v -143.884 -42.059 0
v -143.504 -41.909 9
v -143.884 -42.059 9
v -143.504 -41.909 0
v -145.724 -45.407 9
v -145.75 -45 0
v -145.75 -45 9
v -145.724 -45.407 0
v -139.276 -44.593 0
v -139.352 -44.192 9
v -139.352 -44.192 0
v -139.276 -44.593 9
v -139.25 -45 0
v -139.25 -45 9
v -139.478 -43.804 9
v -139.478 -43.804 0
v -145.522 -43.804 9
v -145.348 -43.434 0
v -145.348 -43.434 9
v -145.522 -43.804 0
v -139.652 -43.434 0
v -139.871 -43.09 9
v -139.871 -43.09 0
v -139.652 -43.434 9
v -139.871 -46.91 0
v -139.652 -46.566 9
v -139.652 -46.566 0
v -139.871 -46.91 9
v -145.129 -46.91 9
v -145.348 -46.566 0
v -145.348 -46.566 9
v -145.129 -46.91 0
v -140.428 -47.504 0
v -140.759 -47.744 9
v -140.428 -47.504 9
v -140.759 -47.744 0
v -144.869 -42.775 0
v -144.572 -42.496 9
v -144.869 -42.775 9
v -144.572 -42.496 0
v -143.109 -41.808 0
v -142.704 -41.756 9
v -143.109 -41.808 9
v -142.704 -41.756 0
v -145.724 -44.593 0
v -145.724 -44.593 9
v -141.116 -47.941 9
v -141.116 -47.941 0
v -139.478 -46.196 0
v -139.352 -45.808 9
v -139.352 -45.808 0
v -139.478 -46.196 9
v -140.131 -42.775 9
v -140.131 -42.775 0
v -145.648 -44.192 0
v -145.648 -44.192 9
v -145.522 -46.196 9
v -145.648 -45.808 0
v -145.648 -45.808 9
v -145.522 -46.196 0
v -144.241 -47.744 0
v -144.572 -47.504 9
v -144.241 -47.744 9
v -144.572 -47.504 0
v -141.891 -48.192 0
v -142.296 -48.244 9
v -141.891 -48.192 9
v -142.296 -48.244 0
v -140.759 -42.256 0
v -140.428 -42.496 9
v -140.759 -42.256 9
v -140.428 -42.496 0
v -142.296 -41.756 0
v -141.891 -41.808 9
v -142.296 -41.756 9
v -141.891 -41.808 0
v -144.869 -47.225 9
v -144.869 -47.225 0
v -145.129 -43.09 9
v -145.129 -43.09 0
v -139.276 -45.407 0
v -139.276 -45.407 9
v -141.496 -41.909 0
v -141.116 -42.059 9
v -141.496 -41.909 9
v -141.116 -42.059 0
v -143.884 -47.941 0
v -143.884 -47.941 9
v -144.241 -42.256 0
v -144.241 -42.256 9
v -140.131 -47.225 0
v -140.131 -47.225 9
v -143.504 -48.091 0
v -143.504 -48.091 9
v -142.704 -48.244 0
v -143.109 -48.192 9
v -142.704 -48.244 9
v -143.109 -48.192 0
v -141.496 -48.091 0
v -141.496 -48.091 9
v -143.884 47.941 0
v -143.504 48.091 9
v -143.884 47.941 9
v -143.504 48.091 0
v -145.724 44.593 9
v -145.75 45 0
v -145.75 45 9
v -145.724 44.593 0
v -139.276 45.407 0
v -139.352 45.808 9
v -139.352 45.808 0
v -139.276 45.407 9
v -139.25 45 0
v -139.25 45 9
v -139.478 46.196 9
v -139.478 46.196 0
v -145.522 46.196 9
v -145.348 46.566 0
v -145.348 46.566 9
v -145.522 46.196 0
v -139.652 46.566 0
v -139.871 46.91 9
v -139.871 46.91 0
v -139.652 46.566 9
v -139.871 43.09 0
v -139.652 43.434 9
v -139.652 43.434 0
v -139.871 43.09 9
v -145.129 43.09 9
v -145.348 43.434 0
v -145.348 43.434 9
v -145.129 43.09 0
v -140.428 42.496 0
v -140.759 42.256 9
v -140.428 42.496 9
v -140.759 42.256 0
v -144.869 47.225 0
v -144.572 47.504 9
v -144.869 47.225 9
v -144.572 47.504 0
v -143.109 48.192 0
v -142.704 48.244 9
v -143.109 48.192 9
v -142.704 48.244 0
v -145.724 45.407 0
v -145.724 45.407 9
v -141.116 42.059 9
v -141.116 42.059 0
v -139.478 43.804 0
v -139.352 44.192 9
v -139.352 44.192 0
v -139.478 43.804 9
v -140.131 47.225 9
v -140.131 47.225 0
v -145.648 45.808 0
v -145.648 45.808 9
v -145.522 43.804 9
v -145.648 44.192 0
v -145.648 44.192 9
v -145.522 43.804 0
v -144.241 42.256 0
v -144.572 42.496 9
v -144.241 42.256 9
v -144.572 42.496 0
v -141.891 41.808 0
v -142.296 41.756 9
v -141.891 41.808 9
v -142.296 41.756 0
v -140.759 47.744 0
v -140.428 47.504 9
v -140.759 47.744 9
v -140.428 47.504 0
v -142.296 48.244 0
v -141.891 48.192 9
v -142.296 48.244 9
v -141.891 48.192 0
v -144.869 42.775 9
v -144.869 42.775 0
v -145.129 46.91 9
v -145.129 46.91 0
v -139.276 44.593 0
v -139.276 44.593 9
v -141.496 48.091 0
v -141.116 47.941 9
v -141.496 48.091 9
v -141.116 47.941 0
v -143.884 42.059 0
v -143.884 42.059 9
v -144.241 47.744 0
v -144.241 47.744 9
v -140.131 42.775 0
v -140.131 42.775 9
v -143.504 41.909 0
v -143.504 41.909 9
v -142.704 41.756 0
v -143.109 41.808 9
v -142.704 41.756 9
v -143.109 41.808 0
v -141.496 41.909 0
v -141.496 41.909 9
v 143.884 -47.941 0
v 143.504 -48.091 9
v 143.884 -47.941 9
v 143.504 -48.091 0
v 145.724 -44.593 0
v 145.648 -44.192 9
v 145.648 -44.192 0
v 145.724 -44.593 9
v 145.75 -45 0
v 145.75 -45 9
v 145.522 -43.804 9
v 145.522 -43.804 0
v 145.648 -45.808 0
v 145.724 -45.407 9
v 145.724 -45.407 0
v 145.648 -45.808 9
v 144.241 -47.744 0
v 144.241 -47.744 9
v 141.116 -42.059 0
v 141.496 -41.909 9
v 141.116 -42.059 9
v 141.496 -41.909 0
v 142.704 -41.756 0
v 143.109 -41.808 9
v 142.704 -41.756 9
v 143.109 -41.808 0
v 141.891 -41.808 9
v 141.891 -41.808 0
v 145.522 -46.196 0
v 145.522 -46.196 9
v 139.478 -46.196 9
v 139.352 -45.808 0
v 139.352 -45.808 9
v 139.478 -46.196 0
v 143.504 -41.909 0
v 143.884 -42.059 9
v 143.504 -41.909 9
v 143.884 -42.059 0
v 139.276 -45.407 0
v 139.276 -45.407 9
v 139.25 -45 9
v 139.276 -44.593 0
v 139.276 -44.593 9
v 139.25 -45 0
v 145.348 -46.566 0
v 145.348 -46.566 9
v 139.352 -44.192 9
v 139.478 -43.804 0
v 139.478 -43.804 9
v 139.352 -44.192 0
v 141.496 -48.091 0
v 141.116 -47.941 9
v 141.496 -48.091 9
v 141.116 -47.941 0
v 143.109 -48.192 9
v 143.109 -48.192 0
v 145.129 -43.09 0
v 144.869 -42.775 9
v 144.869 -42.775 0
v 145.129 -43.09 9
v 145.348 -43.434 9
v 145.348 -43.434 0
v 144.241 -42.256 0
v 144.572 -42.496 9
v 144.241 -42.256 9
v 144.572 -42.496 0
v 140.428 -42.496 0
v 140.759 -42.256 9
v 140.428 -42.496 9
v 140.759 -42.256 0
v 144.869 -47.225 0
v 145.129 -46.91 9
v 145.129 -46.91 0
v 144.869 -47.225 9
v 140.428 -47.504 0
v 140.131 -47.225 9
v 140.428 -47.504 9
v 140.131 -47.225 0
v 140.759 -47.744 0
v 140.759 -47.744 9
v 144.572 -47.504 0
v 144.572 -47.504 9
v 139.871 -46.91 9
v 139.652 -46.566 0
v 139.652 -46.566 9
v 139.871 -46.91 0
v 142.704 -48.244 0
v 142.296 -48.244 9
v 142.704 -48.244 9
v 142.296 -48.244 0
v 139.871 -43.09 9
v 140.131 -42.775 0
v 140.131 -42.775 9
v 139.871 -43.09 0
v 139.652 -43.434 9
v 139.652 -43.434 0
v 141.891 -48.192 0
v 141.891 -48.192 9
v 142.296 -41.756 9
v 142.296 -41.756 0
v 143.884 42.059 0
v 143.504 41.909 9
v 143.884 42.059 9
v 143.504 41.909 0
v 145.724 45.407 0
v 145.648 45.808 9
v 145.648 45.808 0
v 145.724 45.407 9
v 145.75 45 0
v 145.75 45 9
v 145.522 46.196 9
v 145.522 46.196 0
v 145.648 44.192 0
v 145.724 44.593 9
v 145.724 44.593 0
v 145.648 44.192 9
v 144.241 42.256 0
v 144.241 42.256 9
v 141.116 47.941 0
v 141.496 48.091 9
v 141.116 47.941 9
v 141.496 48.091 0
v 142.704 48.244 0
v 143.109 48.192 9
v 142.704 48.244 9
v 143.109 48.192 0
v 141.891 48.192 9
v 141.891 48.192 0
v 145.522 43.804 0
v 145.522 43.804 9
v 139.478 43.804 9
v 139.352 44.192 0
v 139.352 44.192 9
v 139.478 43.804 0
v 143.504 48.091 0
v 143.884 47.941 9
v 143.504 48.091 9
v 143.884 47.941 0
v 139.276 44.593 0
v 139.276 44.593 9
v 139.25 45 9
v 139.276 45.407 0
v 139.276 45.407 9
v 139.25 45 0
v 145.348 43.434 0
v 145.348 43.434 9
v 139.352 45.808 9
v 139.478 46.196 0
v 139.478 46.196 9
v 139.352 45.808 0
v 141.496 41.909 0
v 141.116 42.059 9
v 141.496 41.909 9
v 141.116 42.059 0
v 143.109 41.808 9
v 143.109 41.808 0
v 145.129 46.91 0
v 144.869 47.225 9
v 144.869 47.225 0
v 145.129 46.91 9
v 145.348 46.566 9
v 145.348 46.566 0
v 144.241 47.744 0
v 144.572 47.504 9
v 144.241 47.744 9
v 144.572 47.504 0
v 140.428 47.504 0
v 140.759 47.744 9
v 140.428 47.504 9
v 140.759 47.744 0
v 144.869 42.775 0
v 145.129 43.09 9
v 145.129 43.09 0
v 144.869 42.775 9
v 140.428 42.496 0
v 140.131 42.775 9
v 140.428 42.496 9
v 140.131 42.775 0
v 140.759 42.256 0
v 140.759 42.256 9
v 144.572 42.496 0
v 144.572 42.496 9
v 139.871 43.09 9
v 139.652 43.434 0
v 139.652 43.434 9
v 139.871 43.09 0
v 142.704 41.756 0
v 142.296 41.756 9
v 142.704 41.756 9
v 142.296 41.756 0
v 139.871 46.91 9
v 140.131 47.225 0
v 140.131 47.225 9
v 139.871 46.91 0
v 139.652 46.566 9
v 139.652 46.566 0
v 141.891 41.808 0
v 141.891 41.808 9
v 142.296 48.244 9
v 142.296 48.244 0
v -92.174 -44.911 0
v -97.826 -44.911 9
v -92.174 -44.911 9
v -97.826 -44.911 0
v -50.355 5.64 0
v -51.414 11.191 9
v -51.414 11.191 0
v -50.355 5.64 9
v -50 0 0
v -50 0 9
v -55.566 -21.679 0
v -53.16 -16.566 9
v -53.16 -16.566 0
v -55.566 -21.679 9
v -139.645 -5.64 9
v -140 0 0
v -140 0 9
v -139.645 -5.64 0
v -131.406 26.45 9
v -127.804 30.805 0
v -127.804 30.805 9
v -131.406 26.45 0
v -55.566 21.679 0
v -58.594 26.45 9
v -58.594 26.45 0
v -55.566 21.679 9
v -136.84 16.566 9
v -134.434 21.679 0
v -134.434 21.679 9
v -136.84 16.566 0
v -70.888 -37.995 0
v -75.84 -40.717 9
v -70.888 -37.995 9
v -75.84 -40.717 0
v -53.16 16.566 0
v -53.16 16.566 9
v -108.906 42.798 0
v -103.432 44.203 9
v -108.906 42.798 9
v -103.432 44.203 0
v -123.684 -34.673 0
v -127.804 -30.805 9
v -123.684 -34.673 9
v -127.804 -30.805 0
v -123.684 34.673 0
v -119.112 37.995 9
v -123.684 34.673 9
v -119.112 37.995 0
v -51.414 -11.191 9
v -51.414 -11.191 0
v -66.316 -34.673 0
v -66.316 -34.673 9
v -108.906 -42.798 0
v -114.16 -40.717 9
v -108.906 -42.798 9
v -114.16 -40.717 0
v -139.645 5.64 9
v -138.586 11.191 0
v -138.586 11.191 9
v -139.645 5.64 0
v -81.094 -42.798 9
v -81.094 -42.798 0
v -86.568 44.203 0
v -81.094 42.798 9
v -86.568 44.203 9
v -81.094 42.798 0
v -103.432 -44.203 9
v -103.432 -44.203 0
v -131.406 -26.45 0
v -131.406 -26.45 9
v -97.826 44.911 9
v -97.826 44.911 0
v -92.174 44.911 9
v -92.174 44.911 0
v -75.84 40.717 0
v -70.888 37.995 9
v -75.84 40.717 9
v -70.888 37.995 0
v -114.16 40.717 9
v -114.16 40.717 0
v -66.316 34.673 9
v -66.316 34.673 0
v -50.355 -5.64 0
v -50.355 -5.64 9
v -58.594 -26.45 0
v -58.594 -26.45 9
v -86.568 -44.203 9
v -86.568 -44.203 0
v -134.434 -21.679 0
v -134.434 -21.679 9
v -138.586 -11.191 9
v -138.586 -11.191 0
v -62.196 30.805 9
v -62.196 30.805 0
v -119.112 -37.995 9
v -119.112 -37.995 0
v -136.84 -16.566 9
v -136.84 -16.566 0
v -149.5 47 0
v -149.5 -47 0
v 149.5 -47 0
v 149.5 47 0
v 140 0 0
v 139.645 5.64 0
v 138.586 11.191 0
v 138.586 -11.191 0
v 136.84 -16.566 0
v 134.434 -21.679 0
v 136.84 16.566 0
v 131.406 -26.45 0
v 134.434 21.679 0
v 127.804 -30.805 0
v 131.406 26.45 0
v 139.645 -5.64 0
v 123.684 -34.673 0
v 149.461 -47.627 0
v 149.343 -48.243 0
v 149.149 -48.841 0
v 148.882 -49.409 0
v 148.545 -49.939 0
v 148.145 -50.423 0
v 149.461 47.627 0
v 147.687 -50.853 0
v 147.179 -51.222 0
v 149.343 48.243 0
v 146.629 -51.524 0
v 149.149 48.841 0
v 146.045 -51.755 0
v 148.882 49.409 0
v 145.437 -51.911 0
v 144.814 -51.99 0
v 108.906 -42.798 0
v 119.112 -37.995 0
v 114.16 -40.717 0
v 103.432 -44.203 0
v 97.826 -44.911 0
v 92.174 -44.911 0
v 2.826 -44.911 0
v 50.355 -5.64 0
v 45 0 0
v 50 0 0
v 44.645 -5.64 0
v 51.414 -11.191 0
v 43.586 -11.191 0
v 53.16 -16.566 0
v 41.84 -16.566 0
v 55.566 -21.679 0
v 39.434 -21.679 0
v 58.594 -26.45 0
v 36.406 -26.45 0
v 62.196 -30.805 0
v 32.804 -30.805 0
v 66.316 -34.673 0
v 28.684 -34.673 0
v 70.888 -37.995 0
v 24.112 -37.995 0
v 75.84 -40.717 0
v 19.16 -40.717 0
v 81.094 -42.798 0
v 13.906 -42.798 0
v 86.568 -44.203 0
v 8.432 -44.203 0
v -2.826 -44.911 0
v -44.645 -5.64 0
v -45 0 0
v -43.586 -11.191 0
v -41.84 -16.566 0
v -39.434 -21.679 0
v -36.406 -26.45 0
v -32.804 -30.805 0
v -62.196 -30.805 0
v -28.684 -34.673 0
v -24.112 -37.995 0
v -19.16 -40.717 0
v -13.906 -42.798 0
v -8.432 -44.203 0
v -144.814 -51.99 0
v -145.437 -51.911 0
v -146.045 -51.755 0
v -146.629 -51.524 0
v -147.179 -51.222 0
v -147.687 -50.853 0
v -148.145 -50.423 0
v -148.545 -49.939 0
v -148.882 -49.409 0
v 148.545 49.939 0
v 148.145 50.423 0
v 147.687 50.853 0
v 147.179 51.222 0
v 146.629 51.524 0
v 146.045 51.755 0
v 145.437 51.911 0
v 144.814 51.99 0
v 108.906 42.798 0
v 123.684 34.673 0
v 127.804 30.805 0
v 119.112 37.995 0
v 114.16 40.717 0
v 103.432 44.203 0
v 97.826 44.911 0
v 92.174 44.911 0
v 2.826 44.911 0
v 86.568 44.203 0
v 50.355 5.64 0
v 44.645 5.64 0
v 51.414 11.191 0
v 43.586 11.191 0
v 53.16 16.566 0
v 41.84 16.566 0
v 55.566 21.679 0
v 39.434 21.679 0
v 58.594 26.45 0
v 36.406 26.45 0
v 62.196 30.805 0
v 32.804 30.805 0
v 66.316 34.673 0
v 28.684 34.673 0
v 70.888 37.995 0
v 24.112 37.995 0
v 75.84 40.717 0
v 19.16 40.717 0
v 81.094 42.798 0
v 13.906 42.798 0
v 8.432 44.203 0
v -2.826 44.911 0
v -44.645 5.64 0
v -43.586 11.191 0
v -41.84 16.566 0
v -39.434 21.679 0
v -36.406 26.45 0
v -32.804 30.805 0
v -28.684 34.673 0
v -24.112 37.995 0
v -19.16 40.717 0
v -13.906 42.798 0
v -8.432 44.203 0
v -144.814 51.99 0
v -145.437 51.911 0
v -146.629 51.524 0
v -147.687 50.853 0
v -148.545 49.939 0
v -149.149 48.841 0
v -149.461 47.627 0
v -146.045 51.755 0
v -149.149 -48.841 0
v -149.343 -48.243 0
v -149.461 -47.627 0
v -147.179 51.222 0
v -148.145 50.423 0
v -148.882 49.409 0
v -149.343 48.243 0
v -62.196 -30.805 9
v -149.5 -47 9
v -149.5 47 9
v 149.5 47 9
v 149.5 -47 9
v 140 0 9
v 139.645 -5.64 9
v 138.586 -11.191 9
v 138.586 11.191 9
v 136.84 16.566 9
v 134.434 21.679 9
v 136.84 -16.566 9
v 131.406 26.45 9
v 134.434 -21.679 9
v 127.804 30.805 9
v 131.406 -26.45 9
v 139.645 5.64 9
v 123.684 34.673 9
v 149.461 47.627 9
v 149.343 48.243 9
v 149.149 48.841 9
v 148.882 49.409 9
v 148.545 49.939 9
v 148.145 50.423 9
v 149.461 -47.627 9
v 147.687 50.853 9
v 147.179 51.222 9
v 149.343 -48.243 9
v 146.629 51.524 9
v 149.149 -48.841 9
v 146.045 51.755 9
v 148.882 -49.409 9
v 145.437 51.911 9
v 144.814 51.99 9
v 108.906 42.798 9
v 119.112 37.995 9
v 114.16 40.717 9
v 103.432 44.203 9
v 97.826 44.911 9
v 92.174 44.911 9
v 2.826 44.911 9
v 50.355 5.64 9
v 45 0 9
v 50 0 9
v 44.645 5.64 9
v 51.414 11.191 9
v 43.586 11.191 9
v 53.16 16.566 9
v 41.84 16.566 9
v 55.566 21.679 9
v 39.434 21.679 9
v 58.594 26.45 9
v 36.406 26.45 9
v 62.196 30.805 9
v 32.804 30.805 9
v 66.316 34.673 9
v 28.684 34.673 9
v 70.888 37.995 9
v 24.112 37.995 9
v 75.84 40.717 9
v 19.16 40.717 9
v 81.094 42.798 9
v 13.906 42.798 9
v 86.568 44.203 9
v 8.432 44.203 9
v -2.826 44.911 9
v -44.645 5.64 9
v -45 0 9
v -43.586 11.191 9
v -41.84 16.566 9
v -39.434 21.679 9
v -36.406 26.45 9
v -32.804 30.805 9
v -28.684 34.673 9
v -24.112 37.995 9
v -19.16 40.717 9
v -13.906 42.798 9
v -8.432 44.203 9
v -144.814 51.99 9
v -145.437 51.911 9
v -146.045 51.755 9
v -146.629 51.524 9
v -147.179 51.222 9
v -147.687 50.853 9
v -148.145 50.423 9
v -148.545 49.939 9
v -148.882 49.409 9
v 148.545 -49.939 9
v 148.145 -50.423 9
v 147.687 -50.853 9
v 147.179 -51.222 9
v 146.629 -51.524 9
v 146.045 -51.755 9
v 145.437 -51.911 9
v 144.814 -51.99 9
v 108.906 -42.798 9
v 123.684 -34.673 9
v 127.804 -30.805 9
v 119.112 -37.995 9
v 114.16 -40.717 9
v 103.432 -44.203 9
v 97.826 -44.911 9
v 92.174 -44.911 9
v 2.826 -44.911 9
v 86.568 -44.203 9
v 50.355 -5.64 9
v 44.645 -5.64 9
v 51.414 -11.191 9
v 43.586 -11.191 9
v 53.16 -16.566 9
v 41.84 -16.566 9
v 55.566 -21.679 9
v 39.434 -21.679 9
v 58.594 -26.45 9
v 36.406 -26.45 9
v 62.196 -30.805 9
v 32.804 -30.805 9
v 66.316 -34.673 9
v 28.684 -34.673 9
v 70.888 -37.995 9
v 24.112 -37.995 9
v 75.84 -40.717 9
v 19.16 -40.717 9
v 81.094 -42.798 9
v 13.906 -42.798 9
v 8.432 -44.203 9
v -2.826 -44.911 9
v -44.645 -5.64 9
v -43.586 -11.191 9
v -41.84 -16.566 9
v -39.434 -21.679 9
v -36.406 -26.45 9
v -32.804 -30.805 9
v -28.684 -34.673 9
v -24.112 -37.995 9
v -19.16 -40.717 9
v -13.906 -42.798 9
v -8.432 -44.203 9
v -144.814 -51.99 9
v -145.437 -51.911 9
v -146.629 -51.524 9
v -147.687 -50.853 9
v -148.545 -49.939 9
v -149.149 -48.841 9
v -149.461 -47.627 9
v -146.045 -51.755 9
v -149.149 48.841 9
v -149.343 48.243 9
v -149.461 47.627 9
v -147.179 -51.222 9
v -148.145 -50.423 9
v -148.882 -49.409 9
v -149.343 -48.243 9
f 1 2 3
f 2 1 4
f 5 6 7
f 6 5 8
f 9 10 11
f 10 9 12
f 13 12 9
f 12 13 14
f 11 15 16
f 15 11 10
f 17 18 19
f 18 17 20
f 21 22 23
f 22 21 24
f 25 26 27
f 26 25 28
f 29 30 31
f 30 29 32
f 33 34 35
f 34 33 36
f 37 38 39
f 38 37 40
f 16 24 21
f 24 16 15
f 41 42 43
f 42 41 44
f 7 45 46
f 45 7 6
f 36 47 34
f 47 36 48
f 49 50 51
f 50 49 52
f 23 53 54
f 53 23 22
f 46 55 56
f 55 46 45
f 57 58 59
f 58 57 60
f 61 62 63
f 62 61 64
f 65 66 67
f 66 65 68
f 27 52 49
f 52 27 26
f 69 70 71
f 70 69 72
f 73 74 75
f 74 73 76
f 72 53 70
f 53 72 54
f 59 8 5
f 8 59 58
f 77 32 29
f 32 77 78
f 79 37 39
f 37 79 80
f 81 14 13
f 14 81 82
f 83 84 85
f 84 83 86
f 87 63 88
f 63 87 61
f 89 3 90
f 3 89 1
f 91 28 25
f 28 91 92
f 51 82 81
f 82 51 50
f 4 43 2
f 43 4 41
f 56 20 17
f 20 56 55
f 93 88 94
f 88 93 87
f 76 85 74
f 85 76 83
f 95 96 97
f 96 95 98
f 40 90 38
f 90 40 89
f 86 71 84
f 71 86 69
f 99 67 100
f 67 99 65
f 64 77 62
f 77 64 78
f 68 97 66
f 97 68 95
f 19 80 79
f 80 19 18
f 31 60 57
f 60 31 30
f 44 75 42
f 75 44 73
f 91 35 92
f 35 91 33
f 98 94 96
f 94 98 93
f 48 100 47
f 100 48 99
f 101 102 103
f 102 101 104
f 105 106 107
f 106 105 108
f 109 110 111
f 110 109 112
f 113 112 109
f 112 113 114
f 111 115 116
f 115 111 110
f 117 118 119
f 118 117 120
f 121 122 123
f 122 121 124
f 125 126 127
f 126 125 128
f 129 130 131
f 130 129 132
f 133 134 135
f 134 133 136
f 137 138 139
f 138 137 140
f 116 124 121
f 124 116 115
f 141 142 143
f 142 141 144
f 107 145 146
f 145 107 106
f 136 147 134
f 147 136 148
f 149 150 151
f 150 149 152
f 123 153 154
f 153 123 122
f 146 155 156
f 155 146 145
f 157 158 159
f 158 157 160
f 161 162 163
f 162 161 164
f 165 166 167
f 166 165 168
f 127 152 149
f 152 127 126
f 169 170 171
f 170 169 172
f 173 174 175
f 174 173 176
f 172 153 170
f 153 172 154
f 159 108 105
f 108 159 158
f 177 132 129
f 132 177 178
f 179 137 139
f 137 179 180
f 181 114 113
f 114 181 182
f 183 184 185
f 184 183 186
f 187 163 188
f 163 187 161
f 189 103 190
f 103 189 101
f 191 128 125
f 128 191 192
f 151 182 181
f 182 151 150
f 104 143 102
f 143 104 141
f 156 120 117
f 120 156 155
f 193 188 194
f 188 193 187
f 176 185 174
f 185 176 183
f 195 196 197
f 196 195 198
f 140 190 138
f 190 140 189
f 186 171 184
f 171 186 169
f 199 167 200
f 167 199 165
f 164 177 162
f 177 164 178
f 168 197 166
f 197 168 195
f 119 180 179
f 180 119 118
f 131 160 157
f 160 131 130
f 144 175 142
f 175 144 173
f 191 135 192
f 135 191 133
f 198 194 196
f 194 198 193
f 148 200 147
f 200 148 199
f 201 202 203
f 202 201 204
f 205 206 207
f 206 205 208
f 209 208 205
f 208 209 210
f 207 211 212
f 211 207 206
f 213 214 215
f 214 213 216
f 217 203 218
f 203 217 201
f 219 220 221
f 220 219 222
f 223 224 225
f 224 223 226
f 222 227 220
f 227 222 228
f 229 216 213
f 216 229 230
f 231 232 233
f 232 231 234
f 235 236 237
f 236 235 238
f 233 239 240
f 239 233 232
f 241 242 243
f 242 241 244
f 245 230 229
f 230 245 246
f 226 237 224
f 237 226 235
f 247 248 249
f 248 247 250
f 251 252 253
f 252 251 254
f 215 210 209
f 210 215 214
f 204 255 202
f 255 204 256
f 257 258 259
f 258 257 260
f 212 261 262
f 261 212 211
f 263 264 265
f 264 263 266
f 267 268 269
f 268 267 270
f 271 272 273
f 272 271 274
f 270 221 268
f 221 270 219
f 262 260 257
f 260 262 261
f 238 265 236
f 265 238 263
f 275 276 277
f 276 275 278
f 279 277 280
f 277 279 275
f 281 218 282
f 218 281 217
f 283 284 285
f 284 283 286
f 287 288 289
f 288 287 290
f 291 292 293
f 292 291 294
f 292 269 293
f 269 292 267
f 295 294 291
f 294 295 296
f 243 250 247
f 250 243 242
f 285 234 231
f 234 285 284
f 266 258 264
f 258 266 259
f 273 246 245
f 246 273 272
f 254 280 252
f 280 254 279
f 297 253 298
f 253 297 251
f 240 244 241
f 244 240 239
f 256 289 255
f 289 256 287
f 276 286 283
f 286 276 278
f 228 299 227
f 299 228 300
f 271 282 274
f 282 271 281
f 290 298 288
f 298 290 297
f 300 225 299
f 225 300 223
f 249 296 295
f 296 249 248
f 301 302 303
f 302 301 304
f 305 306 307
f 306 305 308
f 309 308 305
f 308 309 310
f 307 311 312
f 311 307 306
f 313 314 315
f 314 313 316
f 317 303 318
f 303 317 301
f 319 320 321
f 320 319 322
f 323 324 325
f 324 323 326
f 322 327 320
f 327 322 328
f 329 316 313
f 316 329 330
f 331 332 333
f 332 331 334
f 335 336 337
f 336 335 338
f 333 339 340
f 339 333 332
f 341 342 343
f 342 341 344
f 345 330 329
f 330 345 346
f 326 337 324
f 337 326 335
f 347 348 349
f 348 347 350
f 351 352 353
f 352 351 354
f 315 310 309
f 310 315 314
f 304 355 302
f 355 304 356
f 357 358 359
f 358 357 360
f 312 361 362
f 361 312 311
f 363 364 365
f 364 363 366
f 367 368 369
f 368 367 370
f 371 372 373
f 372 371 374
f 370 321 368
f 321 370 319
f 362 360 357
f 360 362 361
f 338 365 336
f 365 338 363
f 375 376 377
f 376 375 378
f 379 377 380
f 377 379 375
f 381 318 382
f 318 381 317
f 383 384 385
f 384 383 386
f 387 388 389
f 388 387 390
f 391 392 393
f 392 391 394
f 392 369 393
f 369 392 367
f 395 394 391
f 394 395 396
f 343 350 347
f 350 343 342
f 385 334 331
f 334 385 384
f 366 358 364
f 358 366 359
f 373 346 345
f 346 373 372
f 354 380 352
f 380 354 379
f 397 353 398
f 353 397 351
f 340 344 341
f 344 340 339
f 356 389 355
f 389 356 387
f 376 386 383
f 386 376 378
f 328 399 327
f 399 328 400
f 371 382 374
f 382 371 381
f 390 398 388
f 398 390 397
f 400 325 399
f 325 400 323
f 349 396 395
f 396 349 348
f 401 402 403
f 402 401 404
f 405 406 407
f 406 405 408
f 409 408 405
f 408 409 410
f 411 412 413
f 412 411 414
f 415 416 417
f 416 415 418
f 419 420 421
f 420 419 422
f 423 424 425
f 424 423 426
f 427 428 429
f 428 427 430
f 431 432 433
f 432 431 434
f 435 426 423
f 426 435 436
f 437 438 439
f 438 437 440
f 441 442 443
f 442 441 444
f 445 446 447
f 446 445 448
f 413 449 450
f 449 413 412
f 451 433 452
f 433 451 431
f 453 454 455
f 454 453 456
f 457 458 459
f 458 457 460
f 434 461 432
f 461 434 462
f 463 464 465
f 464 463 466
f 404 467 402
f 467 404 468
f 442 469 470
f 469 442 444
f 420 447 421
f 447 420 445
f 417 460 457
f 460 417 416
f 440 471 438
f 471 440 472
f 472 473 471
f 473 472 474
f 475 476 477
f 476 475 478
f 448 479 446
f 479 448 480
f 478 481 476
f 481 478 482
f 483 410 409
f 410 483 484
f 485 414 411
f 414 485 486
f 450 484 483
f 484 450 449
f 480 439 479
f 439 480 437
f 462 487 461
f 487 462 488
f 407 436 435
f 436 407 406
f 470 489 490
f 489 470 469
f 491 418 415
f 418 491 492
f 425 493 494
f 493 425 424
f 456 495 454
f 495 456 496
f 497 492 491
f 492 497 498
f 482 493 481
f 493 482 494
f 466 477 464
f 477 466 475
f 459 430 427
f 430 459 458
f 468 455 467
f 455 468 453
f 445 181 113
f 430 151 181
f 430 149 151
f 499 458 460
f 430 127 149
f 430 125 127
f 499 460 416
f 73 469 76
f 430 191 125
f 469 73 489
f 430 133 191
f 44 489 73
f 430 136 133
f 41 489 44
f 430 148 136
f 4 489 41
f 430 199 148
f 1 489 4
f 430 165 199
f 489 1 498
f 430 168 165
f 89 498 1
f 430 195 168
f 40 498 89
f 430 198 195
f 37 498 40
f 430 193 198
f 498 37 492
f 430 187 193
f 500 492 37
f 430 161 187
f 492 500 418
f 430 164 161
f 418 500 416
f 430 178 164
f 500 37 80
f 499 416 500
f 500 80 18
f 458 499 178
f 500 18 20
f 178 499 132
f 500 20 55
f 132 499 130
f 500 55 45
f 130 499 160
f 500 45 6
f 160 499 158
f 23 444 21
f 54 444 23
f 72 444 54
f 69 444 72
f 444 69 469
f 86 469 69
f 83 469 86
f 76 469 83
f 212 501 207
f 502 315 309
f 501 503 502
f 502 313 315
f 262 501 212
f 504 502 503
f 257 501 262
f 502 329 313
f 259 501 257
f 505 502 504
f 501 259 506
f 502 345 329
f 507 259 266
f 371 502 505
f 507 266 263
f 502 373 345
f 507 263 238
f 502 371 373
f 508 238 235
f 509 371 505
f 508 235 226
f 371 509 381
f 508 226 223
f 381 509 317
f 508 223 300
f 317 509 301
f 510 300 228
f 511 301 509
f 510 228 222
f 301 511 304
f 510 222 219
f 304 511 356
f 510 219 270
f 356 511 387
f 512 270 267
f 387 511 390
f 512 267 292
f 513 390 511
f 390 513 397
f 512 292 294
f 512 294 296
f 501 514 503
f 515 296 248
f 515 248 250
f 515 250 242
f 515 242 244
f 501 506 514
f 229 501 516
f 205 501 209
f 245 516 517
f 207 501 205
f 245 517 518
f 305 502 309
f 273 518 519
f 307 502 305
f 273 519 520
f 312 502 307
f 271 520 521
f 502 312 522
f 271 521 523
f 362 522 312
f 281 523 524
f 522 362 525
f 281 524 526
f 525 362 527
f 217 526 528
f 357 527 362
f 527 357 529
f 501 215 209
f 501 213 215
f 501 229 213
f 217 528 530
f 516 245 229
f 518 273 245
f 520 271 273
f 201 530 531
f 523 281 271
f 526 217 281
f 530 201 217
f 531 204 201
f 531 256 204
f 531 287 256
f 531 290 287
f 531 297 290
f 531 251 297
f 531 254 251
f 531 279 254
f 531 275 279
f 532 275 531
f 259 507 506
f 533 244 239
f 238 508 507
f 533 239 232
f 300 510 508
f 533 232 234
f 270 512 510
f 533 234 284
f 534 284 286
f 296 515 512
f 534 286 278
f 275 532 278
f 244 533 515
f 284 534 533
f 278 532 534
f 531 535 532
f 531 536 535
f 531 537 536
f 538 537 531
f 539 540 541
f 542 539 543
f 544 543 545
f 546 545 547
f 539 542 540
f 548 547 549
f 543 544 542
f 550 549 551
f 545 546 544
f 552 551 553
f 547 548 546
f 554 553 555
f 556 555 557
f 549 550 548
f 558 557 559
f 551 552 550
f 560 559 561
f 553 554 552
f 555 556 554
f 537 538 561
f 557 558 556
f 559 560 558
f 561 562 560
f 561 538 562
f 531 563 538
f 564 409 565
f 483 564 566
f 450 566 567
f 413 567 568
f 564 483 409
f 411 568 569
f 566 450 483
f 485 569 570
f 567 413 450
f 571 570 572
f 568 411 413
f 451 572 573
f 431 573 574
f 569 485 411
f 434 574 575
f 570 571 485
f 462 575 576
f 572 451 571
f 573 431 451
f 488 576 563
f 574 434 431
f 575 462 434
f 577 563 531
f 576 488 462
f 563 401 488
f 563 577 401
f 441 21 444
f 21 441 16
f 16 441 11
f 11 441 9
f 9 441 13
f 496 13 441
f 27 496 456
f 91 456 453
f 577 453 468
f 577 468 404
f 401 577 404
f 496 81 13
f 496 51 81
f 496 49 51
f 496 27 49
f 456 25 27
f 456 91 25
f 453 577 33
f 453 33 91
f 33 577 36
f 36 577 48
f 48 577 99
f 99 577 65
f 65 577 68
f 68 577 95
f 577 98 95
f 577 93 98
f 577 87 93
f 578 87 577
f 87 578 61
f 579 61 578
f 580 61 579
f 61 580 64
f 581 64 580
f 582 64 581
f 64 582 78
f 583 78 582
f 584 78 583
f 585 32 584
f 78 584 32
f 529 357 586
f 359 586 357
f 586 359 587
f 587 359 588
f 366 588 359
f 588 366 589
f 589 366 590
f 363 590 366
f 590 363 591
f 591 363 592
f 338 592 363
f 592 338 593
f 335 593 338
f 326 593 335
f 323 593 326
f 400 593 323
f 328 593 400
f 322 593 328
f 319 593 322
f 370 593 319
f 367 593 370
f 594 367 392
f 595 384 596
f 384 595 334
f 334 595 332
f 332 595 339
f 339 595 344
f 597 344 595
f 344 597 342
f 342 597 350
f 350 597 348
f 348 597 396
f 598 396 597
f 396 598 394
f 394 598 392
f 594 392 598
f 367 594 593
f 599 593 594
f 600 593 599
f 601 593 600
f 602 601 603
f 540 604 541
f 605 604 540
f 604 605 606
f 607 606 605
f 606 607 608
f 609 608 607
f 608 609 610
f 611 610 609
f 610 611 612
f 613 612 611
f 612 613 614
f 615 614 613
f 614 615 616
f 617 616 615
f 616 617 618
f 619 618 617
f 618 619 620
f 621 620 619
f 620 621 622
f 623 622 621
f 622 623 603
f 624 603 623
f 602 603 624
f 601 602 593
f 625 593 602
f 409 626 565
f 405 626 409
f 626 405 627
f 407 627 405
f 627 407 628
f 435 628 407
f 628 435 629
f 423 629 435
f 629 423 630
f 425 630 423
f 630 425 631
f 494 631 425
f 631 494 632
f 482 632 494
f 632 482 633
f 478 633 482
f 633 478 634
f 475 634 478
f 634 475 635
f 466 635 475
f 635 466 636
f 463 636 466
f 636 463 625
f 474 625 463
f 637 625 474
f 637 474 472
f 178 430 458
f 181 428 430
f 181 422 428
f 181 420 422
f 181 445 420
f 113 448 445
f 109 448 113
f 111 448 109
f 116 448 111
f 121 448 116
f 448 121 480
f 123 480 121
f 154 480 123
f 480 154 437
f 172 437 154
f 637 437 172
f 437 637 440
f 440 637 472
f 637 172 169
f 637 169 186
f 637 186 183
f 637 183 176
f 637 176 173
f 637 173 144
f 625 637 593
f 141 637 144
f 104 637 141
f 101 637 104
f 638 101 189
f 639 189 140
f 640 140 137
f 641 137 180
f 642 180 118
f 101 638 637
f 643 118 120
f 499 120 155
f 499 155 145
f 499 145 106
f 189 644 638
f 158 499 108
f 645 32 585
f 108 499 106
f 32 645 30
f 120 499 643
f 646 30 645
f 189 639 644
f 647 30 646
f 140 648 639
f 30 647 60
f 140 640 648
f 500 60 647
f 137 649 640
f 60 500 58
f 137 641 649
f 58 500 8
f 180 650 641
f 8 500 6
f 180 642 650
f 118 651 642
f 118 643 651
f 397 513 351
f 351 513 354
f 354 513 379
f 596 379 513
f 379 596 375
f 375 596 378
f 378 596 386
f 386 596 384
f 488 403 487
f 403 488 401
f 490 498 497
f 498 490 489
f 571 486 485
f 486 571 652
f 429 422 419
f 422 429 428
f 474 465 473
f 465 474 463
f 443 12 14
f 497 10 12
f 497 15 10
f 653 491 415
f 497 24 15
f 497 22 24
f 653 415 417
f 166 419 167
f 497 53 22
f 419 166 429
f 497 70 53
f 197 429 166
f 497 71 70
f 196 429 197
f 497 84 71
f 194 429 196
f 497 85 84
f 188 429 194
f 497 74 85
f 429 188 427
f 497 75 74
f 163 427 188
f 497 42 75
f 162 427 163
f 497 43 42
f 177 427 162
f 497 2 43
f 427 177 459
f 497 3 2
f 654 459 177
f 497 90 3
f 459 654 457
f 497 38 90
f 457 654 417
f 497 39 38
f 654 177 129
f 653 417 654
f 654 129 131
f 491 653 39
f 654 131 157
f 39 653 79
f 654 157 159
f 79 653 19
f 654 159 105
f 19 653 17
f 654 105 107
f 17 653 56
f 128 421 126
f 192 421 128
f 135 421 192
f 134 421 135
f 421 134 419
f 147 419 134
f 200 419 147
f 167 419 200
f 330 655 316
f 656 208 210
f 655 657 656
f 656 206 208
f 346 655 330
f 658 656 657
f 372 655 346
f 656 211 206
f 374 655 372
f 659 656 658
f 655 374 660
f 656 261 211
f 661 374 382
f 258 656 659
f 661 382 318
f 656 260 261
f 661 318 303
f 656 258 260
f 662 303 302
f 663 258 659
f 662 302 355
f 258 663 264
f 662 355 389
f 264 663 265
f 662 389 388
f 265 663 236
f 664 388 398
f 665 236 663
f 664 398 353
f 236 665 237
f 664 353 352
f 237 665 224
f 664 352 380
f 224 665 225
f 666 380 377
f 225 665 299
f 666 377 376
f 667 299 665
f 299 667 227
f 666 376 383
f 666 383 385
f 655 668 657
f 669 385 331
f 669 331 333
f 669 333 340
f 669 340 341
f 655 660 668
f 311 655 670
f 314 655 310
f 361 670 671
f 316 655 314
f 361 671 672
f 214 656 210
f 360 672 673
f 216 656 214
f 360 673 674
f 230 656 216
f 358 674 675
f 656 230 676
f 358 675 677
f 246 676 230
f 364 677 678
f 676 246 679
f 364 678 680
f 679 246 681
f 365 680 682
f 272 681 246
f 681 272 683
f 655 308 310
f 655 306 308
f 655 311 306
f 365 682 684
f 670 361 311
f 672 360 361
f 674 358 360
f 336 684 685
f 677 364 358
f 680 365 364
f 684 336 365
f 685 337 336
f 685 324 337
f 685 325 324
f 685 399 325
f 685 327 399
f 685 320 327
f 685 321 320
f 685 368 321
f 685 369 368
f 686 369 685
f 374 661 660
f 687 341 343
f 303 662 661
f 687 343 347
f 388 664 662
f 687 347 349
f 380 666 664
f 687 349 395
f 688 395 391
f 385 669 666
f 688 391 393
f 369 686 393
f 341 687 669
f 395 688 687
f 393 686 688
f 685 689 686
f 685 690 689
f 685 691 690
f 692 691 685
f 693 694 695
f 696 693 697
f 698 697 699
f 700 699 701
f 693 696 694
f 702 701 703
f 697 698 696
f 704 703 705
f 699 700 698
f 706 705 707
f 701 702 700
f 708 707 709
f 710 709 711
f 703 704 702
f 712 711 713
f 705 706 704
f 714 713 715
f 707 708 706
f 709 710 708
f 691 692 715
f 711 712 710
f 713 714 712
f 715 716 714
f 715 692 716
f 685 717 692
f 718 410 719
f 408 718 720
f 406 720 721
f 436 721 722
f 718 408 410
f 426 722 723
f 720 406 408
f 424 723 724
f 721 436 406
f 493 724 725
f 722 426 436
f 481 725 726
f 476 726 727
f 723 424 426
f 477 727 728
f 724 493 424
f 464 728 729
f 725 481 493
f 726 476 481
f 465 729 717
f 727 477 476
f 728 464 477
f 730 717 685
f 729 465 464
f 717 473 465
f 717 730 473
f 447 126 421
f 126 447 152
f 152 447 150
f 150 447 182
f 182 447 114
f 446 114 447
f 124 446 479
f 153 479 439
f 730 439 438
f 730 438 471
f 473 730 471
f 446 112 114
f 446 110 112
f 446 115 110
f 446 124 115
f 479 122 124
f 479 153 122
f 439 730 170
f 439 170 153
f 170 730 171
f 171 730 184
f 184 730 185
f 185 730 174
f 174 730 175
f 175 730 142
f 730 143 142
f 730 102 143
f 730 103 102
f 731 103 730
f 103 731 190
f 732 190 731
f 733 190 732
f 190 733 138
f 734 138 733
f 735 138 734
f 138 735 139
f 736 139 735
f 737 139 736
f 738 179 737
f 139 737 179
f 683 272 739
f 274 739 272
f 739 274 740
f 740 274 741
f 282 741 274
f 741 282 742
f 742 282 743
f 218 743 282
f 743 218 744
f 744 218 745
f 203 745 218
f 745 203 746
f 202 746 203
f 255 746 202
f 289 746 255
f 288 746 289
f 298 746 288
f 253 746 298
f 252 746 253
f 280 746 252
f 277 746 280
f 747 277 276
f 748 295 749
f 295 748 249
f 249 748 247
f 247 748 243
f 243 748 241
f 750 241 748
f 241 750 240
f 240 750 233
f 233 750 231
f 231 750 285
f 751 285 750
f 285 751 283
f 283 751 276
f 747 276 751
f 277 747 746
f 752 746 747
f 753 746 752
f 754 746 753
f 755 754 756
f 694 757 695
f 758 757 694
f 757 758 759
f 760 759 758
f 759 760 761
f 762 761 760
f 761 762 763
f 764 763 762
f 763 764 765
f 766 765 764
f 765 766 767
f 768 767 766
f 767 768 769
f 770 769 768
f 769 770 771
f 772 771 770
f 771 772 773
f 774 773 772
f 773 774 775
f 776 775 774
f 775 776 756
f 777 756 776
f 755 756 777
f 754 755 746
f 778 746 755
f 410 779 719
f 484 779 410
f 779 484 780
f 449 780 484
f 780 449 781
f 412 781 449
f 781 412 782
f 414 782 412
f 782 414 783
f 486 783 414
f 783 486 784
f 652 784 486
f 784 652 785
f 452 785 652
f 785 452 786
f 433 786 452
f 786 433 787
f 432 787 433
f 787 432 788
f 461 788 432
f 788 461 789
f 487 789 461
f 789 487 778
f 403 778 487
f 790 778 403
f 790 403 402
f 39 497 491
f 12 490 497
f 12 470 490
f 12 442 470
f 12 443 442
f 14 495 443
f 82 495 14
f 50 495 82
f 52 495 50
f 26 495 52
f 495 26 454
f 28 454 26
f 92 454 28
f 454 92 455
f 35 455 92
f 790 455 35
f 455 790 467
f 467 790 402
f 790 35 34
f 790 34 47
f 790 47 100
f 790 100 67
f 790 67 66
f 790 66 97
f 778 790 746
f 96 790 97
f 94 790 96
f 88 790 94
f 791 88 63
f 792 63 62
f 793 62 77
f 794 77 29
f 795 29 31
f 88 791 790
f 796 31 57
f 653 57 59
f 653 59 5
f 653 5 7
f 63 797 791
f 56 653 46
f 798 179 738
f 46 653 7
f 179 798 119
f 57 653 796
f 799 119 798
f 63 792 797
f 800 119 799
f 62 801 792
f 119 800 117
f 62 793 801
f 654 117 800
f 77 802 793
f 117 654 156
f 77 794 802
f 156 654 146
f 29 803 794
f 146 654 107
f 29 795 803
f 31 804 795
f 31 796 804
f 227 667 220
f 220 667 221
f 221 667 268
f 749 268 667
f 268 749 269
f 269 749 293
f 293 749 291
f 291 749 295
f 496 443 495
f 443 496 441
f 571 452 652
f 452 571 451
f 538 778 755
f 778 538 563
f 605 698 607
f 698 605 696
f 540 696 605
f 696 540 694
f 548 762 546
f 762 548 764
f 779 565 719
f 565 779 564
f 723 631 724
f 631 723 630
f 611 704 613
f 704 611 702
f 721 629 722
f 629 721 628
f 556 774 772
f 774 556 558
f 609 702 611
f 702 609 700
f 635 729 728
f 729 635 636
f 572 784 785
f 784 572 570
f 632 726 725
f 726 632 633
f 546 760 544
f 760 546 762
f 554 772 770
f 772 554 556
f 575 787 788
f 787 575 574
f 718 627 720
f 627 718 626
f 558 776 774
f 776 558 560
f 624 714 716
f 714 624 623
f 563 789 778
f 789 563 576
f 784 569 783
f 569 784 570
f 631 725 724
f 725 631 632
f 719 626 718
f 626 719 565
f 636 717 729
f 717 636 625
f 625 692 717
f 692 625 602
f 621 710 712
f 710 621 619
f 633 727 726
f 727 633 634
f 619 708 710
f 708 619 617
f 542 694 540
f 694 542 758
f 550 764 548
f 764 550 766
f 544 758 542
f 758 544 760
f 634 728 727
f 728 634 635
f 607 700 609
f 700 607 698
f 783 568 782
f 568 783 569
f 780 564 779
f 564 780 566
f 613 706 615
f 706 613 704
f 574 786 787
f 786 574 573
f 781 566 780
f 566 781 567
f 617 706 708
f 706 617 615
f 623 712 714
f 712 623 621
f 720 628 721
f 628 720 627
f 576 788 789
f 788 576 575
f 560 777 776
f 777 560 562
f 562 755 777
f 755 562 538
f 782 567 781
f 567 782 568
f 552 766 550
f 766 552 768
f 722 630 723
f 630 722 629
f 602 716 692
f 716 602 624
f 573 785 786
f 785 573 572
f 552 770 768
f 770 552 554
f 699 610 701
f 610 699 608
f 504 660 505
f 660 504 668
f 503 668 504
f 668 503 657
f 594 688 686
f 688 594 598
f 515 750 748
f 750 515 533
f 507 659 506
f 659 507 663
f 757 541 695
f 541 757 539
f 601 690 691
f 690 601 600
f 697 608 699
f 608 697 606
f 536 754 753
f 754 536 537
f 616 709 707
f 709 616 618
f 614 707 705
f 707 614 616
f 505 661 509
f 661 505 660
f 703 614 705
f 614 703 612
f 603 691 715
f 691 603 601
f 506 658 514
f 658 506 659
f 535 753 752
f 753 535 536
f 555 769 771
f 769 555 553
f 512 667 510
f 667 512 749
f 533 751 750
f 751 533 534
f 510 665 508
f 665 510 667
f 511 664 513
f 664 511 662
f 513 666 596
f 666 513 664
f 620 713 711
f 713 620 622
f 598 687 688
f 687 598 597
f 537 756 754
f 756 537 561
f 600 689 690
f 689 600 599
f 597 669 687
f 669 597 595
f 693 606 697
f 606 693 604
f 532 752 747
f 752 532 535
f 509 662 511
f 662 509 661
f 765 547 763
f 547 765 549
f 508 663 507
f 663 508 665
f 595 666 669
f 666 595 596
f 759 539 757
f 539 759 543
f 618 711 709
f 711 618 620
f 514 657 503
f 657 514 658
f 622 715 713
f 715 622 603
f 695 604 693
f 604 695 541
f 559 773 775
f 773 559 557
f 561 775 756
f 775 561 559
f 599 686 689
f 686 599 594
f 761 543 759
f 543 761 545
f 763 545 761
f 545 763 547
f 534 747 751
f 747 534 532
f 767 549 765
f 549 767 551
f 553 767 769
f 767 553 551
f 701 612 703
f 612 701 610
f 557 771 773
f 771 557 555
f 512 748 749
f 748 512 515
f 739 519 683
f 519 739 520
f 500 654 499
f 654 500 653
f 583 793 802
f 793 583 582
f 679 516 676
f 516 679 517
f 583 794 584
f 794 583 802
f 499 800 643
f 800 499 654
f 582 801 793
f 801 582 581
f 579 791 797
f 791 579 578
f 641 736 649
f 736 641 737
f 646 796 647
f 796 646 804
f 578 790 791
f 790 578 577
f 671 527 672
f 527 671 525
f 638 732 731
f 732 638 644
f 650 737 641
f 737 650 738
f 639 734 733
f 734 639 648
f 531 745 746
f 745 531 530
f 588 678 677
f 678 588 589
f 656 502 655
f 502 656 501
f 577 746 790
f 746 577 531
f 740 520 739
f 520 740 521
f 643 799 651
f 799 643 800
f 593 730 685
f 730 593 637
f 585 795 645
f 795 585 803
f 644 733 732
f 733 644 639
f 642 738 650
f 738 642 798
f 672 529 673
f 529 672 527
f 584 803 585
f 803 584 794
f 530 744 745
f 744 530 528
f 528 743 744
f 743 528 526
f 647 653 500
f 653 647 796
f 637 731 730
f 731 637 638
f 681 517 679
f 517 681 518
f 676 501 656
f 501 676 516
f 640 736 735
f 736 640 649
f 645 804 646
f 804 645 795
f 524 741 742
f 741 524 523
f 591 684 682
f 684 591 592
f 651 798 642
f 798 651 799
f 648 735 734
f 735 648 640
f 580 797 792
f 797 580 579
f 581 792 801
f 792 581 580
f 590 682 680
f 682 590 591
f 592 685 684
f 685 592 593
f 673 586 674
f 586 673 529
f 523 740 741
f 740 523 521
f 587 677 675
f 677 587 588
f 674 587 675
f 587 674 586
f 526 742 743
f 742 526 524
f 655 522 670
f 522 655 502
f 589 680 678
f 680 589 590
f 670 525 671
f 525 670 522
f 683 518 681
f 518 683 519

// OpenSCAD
$fn = 50;

difference() {
	union() {
		hull() {
			translate(v = [-144.5, 47.0, 0]) {
				cylinder(h = 9, r = 5);
			}
			translate(v = [144.5, 47.0, 0]) {
				cylinder(h = 9, r = 5);
			}
			translate(v = [-144.5, -47.0, 0]) {
				cylinder(h = 9, r = 5);
			}
			translate(v = [144.5, -47.0, 0]) {
				cylinder(h = 9, r = 5);
			}
		}
	}
	union() {
		translate(v = [-142.5, -45.0, -100.0]) {
			cylinder(h = 200, r = 3.25);
		}
		translate(v = [-142.5, 45.0, -100.0]) {
			cylinder(h = 200, r = 3.25);
		}
		translate(v = [142.5, -45.0, -100.0]) {
			cylinder(h = 200, r = 3.25);
		}
		translate(v = [142.5, 45.0, -100.0]) {
			cylinder(h = 200, r = 3.25);
		}
		translate(v = [-142.5, -45.0, -100.0]) {
			cylinder(h = 200, r = 1.8);
		}
		translate(v = [-142.5, 45.0, -100.0]) {
			cylinder(h = 200, r = 1.8);
		}
		translate(v = [142.5, -45.0, -100.0]) {
			cylinder(h = 200, r = 1.8);
		}
		translate(v = [142.5, 45.0, -100.0]) {
			cylinder(h = 200, r = 1.8);
		}
		translate(v = [-95.0, 0, 0.0]) {
			cylinder(h = 9, r = 45.0);
		}
		cylinder(h = 9, r = 45.0);
		translate(v = [95.0, 0, 0.0]) {
			cylinder(h = 9, r = 45.0);
		}
	}
}
